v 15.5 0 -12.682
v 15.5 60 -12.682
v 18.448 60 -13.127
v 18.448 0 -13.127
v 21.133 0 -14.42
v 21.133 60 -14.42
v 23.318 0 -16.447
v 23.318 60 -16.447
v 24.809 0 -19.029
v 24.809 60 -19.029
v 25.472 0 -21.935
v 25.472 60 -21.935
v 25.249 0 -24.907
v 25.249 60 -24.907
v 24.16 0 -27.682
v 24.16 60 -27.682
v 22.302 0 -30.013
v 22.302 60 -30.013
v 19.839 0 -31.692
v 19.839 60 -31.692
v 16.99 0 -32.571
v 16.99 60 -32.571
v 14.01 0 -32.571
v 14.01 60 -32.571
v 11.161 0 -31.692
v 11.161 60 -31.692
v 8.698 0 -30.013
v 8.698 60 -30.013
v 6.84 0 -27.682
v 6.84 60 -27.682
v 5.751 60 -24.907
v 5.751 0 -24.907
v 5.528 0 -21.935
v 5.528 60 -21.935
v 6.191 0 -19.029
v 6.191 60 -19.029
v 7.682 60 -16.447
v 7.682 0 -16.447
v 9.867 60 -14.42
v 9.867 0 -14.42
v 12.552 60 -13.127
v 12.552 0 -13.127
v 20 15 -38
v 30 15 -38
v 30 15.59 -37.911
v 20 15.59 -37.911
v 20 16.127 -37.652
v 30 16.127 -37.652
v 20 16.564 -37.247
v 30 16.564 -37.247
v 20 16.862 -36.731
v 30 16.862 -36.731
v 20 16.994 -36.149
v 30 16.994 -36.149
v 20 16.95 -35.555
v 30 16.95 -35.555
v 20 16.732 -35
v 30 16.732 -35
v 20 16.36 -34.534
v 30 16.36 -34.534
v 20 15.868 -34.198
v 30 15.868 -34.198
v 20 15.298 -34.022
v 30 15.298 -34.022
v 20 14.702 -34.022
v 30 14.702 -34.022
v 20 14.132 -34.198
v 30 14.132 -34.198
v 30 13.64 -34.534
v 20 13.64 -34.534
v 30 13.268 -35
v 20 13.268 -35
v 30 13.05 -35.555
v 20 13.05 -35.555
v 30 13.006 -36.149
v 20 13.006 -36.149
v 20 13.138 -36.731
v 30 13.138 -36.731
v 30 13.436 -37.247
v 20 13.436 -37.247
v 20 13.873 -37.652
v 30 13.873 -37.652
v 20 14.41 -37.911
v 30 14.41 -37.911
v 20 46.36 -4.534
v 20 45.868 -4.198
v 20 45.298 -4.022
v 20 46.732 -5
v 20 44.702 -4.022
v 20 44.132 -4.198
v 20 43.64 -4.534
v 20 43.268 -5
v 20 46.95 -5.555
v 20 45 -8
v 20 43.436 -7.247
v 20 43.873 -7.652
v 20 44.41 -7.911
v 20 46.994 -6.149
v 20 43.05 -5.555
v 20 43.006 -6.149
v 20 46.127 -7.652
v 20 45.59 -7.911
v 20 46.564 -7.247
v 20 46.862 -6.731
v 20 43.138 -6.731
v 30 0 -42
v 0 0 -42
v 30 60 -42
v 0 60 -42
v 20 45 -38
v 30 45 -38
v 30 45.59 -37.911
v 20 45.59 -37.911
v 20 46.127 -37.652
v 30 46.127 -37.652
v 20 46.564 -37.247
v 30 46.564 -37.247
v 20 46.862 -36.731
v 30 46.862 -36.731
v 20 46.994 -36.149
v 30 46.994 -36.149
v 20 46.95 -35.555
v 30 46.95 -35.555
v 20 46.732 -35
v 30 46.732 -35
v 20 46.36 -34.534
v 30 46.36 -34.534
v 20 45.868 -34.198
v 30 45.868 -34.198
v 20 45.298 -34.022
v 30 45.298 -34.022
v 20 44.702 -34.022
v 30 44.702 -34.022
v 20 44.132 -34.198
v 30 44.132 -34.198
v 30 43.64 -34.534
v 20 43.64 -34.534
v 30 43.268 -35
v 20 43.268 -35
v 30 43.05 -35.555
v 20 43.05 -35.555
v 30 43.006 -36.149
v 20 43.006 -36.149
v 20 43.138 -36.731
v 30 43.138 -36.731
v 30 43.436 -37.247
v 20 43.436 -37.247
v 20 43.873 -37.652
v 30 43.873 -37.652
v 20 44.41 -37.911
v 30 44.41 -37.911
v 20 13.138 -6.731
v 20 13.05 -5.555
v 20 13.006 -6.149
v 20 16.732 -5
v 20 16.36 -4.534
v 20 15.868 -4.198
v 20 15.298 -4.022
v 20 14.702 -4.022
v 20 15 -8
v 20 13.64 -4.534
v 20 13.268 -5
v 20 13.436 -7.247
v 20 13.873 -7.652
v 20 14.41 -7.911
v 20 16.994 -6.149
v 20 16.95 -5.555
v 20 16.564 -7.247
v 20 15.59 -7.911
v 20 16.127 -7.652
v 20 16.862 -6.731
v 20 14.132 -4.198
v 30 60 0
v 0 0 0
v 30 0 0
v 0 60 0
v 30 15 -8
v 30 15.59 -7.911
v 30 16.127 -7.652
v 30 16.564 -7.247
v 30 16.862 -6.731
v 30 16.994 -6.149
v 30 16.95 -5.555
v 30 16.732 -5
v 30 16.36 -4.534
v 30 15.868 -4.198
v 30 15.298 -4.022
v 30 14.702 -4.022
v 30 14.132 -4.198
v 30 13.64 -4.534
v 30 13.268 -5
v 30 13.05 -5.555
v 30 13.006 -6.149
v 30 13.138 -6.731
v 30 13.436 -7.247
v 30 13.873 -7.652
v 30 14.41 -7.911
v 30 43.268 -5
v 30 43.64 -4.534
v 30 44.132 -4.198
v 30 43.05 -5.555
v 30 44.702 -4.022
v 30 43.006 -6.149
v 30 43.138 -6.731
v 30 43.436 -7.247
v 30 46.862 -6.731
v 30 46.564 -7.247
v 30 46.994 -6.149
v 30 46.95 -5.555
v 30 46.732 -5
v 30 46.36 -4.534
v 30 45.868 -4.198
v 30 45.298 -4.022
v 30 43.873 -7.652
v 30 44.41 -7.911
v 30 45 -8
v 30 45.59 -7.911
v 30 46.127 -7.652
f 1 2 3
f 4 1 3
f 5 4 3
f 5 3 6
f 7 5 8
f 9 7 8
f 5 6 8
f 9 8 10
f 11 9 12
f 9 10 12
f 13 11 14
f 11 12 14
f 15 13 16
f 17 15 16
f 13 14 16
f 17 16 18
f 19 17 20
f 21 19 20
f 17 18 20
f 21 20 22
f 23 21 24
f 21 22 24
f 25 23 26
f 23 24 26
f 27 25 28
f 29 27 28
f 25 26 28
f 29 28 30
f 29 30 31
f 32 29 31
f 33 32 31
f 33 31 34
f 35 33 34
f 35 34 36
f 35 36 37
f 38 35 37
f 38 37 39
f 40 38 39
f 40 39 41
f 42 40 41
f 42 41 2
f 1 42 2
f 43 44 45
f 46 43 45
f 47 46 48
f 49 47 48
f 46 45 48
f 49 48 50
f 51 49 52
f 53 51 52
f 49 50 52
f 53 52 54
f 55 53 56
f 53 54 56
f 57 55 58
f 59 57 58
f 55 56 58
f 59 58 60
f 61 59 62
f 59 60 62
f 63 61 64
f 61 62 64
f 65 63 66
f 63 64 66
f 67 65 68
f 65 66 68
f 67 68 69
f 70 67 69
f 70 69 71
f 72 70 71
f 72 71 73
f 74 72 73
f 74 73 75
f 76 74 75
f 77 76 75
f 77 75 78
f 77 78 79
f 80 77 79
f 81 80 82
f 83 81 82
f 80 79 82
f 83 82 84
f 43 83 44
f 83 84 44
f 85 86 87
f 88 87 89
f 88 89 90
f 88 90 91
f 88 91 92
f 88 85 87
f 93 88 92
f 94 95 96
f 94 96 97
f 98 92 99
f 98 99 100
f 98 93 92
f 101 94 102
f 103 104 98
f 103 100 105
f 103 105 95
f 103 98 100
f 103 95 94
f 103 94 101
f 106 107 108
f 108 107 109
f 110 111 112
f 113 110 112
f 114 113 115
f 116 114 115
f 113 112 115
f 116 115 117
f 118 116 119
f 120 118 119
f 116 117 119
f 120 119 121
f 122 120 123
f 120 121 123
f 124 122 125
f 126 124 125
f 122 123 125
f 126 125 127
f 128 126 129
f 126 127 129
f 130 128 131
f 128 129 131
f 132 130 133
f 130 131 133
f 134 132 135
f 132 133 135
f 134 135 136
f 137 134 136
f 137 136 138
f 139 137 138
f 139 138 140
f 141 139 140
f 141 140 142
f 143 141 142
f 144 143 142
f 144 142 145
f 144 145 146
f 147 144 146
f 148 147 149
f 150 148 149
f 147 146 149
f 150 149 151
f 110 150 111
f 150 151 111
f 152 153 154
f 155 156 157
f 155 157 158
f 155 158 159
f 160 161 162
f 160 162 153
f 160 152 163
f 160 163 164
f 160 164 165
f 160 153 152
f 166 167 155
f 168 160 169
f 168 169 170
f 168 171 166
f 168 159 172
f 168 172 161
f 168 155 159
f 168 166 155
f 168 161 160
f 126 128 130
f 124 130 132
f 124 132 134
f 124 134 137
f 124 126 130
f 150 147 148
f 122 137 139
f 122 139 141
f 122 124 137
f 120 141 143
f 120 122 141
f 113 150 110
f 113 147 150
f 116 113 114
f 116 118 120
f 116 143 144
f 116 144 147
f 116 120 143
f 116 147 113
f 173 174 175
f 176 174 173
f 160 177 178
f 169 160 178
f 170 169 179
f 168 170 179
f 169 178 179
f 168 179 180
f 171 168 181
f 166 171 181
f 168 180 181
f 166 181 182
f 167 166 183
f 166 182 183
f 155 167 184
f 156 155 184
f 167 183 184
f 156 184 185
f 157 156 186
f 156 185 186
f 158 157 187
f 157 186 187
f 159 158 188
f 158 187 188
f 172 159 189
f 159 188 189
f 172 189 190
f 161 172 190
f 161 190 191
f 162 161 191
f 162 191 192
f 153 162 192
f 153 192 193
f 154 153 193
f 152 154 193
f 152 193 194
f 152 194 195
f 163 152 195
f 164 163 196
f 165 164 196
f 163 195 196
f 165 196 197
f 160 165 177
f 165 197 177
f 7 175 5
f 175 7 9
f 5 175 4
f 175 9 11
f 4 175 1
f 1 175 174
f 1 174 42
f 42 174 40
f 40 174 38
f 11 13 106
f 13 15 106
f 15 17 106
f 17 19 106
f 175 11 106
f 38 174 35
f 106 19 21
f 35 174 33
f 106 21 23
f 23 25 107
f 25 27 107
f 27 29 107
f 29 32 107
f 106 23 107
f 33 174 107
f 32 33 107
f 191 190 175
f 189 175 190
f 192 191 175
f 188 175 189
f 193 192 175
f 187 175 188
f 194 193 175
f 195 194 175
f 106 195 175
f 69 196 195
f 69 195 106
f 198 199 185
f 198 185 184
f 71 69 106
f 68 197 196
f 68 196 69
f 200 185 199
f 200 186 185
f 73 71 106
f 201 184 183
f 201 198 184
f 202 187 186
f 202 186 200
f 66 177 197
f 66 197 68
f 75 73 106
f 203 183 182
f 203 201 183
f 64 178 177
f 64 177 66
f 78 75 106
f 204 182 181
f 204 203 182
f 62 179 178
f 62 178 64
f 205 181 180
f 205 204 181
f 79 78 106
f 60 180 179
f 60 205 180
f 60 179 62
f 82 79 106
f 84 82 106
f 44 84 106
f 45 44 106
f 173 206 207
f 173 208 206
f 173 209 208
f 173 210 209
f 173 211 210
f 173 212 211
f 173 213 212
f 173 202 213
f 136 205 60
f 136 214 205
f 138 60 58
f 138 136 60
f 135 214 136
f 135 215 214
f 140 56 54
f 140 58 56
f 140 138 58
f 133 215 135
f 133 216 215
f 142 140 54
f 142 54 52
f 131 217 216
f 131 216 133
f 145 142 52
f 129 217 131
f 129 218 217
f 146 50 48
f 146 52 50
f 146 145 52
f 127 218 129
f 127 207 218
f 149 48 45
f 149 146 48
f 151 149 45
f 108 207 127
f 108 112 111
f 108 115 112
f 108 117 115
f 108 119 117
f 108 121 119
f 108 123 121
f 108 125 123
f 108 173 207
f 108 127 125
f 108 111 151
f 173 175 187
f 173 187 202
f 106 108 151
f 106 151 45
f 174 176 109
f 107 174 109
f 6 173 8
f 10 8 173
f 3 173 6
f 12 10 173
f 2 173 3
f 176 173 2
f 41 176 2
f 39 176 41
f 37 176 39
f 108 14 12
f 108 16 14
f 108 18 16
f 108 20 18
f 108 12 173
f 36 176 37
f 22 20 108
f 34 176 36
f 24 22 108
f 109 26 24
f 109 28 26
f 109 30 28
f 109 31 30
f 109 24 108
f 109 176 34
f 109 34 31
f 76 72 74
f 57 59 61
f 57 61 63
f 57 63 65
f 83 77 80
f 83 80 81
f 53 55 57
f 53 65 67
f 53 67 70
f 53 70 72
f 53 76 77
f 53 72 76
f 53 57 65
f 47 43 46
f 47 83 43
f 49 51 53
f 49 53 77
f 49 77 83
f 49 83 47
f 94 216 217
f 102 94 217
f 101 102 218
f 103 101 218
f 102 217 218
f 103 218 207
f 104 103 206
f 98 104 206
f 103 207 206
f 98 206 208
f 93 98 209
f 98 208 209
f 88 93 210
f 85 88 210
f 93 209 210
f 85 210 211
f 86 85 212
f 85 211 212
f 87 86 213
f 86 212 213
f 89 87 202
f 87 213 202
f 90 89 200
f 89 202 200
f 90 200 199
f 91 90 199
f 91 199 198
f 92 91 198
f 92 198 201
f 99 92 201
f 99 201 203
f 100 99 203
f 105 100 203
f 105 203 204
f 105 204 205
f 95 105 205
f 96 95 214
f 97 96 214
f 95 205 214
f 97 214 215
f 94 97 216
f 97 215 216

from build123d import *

# Parameters (mm, degrees)
SKETCH1_W           = 42
SKETCH1_H           = 60
BOSS_EXTRUDE1_DEPTH = 30
SKETCH2_R           = 10
CUT_EXTRUDE1_DEPTH  = 80.14543575
SKETCH3_R           = 2
CUT_EXTRUDE2_DEPTH  = 10


with BuildPart() as part:
    # Sketch1 → Boss-Extrude1 (new body)
    with BuildSketch(Plane(origin=(0, 0, 0), x_dir=(0, 0, -1), z_dir=(1, 0, 0))):
        with Locations((21, 30)):
            Rectangle(SKETCH1_W, SKETCH1_H)
    extrude(amount=BOSS_EXTRUDE1_DEPTH)

    # Sketch2 → Cut-Extrude1 (cut, through all)
    with BuildSketch(Plane(origin=(0, 60, 0), x_dir=(1, 0, 0), z_dir=(0, 1, 0))):
        with Locations(Location((15.5, 22.682266583, 0), (0, 0, 270))):
            Circle(SKETCH2_R)
    extrude(amount=-CUT_EXTRUDE1_DEPTH, mode=Mode.SUBTRACT)

    # Sketch3 → Cut-Extrude2 (cut)
    with BuildSketch(Plane(origin=(30, 0, 0), x_dir=(0, 0, -1), z_dir=(1, 0, 0))):
        with Locations((6, 45)):
            Circle(SKETCH3_R)
        with Locations((36, 45)):
            Circle(SKETCH3_R)
        with Locations((36, 15)):
            Circle(SKETCH3_R)
        with Locations((6, 15)):
            Circle(SKETCH3_R)
    extrude(amount=-CUT_EXTRUDE2_DEPTH, mode=Mode.SUBTRACT)


solid = part.part
